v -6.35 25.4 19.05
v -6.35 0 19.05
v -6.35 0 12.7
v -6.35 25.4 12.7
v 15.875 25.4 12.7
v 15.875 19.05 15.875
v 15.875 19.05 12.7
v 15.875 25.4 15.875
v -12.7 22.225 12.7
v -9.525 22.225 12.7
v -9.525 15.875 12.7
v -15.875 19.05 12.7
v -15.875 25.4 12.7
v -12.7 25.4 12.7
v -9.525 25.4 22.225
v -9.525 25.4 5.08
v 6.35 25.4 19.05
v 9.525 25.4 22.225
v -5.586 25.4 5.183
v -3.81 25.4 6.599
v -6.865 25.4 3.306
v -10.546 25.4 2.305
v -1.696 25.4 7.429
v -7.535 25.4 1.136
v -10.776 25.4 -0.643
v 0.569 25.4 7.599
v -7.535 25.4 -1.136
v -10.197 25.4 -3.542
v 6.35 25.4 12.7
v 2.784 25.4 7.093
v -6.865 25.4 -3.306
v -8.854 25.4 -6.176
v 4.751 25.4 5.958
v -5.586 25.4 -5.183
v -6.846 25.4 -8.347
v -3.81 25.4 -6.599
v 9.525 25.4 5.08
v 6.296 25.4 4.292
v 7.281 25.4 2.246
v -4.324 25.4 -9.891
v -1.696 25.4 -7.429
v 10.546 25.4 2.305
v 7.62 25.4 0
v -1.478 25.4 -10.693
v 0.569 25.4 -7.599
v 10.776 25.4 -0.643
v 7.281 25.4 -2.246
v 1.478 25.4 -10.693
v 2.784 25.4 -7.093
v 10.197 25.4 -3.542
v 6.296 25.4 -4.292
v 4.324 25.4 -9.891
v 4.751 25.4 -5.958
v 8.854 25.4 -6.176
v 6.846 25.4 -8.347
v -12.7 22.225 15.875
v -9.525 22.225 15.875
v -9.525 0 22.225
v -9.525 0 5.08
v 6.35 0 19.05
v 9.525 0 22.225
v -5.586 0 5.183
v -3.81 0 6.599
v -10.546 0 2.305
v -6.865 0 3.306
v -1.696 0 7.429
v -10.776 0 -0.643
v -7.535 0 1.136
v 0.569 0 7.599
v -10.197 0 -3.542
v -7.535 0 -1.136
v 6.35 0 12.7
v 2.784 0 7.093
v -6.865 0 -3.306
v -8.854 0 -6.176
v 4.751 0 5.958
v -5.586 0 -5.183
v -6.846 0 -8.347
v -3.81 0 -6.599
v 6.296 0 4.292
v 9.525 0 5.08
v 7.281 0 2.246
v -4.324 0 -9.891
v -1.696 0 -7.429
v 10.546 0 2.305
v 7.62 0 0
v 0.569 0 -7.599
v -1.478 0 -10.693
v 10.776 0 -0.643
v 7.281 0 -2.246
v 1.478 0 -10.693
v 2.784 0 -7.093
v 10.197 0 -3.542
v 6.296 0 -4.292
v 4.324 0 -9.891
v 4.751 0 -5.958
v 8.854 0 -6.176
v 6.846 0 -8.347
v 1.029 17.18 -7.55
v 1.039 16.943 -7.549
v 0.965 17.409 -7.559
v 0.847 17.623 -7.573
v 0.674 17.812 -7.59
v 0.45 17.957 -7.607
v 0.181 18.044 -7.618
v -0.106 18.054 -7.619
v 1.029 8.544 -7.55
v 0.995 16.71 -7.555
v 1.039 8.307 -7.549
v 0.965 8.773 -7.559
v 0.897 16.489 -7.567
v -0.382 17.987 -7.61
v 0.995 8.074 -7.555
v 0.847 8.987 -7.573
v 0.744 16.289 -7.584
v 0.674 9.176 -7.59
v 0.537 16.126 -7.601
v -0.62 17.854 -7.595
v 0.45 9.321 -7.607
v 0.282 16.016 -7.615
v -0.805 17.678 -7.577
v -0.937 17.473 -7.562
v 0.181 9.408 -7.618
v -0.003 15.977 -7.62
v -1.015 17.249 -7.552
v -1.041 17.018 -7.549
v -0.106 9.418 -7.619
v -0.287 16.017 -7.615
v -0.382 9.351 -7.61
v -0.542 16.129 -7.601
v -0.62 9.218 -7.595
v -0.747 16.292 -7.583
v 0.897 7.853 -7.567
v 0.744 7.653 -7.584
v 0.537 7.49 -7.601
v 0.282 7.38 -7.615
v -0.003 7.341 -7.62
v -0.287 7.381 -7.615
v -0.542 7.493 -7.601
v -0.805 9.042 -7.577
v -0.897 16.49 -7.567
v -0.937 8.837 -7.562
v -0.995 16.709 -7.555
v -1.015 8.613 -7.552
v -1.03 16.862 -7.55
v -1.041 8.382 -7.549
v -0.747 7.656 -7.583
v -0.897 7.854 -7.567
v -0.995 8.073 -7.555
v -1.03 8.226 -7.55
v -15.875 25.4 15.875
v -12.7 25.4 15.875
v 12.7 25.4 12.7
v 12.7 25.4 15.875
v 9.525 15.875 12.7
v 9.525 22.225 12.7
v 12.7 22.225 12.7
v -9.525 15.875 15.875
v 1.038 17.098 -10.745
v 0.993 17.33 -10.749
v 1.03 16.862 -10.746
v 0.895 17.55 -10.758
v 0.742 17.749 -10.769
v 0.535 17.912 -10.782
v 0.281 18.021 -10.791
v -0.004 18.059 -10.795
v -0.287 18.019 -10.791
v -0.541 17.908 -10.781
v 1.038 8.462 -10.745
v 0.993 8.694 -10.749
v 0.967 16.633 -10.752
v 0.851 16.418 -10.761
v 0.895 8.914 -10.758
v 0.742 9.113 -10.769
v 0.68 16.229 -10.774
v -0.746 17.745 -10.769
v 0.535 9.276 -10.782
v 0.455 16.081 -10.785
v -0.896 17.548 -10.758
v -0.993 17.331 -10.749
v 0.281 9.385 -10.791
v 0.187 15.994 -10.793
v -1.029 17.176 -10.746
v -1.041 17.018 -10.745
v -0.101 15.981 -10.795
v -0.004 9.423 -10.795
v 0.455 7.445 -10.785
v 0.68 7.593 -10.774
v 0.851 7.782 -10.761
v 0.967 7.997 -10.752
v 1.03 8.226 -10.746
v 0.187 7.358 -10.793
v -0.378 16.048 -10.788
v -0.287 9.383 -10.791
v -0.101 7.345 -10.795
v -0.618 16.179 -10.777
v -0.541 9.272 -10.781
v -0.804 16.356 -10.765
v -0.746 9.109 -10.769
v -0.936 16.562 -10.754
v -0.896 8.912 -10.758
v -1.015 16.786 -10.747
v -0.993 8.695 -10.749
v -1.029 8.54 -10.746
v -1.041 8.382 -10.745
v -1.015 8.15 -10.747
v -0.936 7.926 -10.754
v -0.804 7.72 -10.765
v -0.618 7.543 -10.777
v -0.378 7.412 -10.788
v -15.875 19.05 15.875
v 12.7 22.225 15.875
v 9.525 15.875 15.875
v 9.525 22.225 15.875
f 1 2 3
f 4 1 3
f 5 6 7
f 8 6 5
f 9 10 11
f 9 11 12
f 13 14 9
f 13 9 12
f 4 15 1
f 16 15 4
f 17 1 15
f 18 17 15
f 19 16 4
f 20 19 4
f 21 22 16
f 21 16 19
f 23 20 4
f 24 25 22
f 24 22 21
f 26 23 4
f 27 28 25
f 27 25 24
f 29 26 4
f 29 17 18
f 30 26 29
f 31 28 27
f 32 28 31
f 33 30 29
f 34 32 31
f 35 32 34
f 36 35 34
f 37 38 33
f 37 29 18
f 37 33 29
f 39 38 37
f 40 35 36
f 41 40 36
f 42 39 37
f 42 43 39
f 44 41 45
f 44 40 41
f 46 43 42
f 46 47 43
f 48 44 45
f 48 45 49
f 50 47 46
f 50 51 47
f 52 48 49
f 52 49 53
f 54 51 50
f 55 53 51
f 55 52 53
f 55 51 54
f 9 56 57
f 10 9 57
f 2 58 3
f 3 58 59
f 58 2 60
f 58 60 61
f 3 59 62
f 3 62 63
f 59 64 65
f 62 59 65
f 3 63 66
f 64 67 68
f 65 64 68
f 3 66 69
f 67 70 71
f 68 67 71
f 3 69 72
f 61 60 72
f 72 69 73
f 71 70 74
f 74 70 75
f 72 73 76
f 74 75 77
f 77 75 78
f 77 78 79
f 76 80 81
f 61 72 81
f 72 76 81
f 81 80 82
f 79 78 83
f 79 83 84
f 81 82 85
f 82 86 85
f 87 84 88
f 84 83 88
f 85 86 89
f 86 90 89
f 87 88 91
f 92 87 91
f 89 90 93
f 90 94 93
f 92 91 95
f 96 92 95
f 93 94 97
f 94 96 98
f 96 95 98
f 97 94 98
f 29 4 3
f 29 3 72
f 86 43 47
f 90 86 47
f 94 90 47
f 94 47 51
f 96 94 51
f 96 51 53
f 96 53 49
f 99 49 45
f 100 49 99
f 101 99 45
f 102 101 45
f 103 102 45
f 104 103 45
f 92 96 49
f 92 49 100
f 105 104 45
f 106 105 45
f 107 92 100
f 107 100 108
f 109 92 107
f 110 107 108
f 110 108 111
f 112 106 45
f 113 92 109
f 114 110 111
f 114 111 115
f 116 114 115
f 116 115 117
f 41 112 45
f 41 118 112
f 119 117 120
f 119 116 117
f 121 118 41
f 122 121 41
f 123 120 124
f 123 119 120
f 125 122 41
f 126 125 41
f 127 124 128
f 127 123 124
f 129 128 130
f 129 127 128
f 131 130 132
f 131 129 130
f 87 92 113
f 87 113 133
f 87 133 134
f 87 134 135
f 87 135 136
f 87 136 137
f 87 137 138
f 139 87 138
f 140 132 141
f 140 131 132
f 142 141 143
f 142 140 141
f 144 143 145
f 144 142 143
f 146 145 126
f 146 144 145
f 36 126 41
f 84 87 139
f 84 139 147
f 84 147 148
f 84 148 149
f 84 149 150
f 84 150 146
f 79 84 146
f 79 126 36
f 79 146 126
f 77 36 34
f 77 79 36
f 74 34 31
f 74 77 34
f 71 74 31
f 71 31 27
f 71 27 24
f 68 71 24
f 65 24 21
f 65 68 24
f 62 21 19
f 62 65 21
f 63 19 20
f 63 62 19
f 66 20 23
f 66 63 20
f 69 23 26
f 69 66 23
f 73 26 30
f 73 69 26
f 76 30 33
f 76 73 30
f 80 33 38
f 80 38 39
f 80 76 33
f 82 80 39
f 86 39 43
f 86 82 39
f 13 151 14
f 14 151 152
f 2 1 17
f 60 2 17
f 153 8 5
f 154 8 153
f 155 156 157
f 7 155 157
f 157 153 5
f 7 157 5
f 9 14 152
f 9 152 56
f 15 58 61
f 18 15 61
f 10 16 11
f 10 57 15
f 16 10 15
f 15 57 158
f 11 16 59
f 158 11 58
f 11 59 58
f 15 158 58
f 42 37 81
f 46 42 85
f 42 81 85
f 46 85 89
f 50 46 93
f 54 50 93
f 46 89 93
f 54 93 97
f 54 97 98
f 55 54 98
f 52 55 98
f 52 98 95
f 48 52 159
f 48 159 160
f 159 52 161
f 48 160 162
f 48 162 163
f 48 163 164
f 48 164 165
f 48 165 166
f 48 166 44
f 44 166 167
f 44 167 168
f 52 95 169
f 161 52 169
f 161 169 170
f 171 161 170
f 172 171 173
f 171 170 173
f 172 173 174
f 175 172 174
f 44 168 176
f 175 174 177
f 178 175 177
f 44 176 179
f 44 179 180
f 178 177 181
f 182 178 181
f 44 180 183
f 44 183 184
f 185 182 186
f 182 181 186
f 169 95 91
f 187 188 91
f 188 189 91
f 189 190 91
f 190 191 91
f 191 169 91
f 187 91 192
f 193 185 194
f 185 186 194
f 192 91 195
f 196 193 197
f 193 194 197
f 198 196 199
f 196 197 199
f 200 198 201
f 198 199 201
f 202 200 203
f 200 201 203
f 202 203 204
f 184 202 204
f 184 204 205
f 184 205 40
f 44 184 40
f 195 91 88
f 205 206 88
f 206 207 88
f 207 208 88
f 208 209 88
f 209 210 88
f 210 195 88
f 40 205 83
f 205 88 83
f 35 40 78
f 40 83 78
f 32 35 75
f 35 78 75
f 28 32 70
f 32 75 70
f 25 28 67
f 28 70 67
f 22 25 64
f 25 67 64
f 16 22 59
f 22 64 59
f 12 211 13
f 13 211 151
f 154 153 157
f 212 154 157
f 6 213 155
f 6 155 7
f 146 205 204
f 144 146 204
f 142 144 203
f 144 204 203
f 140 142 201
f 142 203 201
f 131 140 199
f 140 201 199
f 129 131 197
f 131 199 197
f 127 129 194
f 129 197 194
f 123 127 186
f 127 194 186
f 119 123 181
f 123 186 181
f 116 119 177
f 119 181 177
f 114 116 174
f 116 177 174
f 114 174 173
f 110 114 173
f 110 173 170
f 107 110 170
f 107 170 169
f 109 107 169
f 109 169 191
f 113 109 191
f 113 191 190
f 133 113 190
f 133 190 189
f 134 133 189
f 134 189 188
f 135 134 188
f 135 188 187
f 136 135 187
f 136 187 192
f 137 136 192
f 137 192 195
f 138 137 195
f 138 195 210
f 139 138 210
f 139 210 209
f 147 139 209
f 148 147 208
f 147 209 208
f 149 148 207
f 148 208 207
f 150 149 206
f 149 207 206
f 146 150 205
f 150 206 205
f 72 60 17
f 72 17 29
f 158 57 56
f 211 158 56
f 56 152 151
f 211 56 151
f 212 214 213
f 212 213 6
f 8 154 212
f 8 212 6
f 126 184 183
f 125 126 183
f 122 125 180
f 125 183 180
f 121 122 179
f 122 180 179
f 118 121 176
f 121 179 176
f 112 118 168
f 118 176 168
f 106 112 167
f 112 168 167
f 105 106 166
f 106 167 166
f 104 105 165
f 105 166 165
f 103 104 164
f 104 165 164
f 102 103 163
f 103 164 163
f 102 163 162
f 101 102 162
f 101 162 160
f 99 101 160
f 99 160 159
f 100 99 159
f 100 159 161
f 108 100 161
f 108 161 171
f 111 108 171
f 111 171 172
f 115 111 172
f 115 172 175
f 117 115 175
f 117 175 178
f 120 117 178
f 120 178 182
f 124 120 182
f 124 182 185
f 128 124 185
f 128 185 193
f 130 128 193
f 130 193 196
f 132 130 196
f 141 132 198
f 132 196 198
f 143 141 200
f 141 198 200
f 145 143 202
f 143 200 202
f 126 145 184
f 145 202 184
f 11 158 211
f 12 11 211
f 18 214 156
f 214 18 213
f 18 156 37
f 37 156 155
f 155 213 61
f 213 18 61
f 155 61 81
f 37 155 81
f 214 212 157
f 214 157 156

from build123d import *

# Parameters (mm, degrees)
SKETCH1_R           = 7.62
SKETCH1_W           = 12.7
SKETCH1_H           = 6.35
BOSS_EXTRUDE1_DEPTH = 25.4
BOSS_EXTRUDE2_DEPTH = 3.175
CUT_EXTRUDE1_REACH  = 35.02
SKETCH4_R           = 1.0414


with BuildPart() as part:
    # Sketch1 → Boss-Extrude1 (new body)
    with BuildSketch(Plane(origin=(0, 0, 0), x_dir=(1, 0, 0), z_dir=(0, 1, 0))):
        with BuildLine():
            Line((-9.525, -22.225), (9.525, -22.225))
            Line((9.525, -22.225), (9.525, -5.08))
            ThreePointArc((9.525, -5.08), (0, 10.795), (-9.525, -5.08))
            Line((-9.525, -5.08), (-9.525, -22.225))
        make_face()
        Circle(SKETCH1_R, mode=Mode.SUBTRACT)
        with Locations((0, -15.875)):
            Rectangle(SKETCH1_W, SKETCH1_H, mode=Mode.SUBTRACT)
    extrude(amount=BOSS_EXTRUDE1_DEPTH)

    # Sketch3 → Boss-Extrude2 (add)
    with BuildSketch(Plane(origin=(0, 0, 15.875), x_dir=(-1, 0, 0), z_dir=(0, 0, -1))):
        Polygon((-9.525, 22.225), (-9.525, 15.875), (-15.875, 19.05), (-15.875, 25.4), (-12.7, 25.4), (-12.7, 22.225), align=None)
    boss_extrude2 = extrude(amount=BOSS_EXTRUDE2_DEPTH)

    # Mirror1: Boss-Extrude2 across plane
    add(boss_extrude2.mirror(Plane(origin=(0, 0, 0), x_dir=(0, 0, 1), z_dir=(1, 0, 0))))

    # Sketch4 → Cut-Extrude1 (cut, up to next)
    with BuildSketch(Plane(origin=(0, 0, -10.795), x_dir=(-1, 0, 0), z_dir=(0, 0, -1)), mode=Mode.PRIVATE) as cut_extrude1_sk1:
        with Locations((0, 8.382)):
            Circle(SKETCH4_R)
    cut_extrude1_tool1 = extrude(cut_extrude1_sk1.sketch, amount=-CUT_EXTRUDE1_REACH, mode=Mode.PRIVATE) & part.part
    add(cut_extrude1_tool1.solids().sort_by_distance((0, 8.382, -10.795))[0], mode=Mode.SUBTRACT)
    # Sketch4 → Cut-Extrude1 (cut, up to next)
    with BuildSketch(Plane(origin=(0, 0, -10.795), x_dir=(-1, 0, 0), z_dir=(0, 0, -1)), mode=Mode.PRIVATE) as cut_extrude1_sk2:
        with Locations((0, 17.018)):
            Circle(SKETCH4_R)
    cut_extrude1_tool2 = extrude(cut_extrude1_sk2.sketch, amount=-CUT_EXTRUDE1_REACH, mode=Mode.PRIVATE) & part.part
    add(cut_extrude1_tool2.solids().sort_by_distance((0, 17.018, -10.795))[0], mode=Mode.SUBTRACT)


solid = part.part
